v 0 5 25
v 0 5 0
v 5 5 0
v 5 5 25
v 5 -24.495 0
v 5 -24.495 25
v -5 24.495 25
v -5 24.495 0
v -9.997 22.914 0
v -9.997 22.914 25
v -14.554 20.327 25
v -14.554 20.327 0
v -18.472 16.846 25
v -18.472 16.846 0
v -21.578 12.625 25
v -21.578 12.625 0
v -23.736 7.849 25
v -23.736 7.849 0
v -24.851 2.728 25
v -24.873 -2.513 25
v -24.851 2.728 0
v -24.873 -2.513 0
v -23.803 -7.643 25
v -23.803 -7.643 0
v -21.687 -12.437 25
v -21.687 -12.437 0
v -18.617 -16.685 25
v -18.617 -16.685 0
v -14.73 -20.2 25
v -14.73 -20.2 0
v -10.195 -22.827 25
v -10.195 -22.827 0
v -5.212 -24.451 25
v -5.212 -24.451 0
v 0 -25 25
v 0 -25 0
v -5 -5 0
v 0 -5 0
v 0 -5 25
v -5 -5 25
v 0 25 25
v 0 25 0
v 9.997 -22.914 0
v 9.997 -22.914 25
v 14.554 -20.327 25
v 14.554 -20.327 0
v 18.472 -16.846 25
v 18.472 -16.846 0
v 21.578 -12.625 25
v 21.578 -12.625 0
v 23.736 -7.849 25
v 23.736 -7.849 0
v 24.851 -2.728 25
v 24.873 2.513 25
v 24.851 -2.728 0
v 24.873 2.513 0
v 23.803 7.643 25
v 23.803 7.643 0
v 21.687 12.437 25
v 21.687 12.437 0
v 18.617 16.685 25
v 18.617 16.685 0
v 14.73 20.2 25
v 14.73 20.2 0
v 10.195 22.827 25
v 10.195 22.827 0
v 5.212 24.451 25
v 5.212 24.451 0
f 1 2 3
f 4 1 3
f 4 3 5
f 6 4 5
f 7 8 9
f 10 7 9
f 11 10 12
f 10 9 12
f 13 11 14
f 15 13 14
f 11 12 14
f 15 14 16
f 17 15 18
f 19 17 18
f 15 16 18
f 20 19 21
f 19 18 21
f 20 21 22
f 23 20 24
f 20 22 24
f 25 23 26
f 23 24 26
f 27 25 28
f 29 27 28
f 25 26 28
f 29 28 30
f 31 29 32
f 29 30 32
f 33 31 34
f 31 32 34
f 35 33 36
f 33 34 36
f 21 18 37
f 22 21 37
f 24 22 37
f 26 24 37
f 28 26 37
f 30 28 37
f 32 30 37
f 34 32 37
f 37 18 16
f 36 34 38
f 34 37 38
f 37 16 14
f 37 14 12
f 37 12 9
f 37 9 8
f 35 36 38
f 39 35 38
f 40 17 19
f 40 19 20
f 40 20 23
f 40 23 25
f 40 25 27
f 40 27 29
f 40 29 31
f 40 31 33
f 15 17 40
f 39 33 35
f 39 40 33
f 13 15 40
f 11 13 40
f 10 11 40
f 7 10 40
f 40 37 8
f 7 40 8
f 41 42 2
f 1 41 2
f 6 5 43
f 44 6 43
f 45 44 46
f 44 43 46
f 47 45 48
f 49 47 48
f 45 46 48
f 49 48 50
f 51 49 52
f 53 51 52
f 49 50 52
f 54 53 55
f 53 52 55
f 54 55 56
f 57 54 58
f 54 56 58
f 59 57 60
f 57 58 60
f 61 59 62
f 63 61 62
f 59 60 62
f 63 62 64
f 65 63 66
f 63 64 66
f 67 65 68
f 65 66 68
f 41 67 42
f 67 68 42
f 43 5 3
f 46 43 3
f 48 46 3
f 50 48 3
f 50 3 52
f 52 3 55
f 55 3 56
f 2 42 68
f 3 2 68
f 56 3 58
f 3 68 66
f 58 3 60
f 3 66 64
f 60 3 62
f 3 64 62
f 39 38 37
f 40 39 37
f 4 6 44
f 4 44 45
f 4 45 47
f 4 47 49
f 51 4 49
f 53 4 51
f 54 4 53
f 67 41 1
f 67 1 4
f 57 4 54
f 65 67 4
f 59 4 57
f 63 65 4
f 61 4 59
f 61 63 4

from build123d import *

# Parameters (mm, degrees)
F1_DEPTH = 25


with BuildPart() as f1:
    # F0 (on Top) → F1 (new body)
    with BuildSketch(Plane.XY):
        with BuildLine():
            Line((-5, 5), (-5, 24.494897))
            ThreePointArc((-5, 24.494897), (-24.873404, -2.512724), (0, -25))
            Line((0, -25), (0, -5))
            Line((0, -5), (-5, -5))
            Line((-5, -5), (-5, 0))
            Line((-5, 0), (-5, 5))
        make_face()
        with BuildLine():
            Line((0, 25), (0, 5))
            Line((0, 5), (5, 5))
            Line((5, 5), (5, 0))
            Line((5, 0), (5, -5))
            Line((5, -5), (5, -24.494897))
            ThreePointArc((5, -24.494897), (24.873404, 2.512724), (0, 25))
        make_face()
    extrude(amount=F1_DEPTH)


solid = f1.part
